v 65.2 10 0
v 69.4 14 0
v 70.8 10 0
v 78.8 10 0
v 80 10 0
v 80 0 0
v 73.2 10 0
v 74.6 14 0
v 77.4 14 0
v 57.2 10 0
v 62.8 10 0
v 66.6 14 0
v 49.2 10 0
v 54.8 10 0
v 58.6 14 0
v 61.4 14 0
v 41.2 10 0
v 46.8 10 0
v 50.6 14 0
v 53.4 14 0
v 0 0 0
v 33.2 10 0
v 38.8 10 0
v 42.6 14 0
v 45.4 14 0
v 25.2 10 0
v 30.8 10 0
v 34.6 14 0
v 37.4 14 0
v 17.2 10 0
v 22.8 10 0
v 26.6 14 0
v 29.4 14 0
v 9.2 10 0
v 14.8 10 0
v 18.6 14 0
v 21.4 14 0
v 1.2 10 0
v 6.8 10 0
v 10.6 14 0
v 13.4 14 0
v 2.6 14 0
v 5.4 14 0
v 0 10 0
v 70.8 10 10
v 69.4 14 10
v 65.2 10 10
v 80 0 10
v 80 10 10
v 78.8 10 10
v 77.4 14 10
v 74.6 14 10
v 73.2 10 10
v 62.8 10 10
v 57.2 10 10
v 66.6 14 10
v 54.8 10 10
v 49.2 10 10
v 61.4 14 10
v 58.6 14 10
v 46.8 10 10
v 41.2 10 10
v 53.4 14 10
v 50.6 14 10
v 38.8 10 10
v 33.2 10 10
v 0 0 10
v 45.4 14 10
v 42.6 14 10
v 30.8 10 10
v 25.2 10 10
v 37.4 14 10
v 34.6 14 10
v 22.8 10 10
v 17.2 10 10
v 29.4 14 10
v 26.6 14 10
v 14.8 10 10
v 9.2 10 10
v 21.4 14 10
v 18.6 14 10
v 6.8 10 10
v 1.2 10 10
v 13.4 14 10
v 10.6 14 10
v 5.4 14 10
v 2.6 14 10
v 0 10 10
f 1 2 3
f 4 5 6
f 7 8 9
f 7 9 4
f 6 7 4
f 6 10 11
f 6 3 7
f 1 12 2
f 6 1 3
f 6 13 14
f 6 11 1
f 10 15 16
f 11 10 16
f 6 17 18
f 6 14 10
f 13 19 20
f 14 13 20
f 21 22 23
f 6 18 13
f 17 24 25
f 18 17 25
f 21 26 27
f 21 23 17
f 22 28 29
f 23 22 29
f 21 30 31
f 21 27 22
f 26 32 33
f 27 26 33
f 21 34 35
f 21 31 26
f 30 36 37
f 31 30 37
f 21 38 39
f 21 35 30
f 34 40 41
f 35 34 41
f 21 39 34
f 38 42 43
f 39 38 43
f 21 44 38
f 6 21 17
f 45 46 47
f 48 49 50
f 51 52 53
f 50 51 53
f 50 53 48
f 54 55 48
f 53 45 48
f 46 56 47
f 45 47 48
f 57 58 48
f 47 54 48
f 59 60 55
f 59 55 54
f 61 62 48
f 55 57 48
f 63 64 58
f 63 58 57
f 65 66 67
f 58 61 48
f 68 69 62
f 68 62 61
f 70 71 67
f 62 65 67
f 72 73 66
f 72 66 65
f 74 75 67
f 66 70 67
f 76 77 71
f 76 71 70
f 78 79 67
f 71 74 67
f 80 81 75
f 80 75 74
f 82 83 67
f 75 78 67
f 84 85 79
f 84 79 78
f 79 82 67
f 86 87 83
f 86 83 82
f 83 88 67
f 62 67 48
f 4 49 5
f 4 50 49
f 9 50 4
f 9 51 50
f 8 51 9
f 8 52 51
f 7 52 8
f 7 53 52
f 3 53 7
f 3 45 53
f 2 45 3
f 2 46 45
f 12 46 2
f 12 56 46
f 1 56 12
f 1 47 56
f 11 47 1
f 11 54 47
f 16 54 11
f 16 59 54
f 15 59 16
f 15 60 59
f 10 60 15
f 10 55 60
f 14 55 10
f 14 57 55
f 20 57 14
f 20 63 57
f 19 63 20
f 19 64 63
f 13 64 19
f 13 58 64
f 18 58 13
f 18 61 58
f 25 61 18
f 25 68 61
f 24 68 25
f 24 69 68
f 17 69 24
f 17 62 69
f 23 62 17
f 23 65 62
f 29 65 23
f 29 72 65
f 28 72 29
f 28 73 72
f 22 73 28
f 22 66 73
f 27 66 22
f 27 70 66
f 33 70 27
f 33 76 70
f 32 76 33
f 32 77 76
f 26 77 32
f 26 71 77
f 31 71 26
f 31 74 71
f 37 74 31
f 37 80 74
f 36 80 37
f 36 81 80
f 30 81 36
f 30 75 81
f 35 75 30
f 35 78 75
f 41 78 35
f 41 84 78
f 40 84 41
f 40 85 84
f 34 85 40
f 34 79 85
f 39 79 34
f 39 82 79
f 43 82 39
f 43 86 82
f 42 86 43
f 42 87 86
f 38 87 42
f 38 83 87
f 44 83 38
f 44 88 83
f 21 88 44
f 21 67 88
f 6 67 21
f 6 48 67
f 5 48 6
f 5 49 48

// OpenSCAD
$fn = 32;

// ----------------------------------------------------------------------
// Gear rack: 10 teeth, pitch 8 mm
// ----------------------------------------------------------------------

// --- parameters (mm) ---
teeth = 10;               // number of teeth
pitch = 8;                // tooth pitch, X
root_w = 5.6;             // tooth width at the root
tip_w = 2.8;              // tooth width at the tip
base_h = 10;              // rack body height, Y
tooth_h = 4;              // tooth height above the body
plate_t = 10;             // rack width, Z (extrusion height)

rack_l = teeth * pitch;  // overall length
total_h = base_h + tooth_h;  // overall height

profile = [[0, 0], [80, 0], [80, 10], [78.8, 10], [77.4, 14], [74.6, 14], [73.2, 10], [70.8, 10], [69.4, 14], [66.6, 14], [65.2, 10], [62.8, 10], [61.4, 14], [58.6, 14], [57.2, 10], [54.8, 10], [53.4, 14], [50.6, 14], [49.2, 10], [46.8, 10], [45.4, 14], [42.6, 14], [41.2, 10], [38.8, 10], [37.4, 14], [34.6, 14], [33.2, 10], [30.8, 10], [29.4, 14], [26.6, 14], [25.2, 10], [22.8, 10], [21.4, 14], [18.6, 14], [17.2, 10], [14.8, 10], [13.4, 14], [10.6, 14], [9.2, 10], [6.8, 10], [5.4, 14], [2.6, 14], [1.2, 10], [0, 10]];  // primary outline, 44 points, counter clockwise

// --- the one profile operation ---
linear_extrude(height = plate_t) polygon(points = profile);
